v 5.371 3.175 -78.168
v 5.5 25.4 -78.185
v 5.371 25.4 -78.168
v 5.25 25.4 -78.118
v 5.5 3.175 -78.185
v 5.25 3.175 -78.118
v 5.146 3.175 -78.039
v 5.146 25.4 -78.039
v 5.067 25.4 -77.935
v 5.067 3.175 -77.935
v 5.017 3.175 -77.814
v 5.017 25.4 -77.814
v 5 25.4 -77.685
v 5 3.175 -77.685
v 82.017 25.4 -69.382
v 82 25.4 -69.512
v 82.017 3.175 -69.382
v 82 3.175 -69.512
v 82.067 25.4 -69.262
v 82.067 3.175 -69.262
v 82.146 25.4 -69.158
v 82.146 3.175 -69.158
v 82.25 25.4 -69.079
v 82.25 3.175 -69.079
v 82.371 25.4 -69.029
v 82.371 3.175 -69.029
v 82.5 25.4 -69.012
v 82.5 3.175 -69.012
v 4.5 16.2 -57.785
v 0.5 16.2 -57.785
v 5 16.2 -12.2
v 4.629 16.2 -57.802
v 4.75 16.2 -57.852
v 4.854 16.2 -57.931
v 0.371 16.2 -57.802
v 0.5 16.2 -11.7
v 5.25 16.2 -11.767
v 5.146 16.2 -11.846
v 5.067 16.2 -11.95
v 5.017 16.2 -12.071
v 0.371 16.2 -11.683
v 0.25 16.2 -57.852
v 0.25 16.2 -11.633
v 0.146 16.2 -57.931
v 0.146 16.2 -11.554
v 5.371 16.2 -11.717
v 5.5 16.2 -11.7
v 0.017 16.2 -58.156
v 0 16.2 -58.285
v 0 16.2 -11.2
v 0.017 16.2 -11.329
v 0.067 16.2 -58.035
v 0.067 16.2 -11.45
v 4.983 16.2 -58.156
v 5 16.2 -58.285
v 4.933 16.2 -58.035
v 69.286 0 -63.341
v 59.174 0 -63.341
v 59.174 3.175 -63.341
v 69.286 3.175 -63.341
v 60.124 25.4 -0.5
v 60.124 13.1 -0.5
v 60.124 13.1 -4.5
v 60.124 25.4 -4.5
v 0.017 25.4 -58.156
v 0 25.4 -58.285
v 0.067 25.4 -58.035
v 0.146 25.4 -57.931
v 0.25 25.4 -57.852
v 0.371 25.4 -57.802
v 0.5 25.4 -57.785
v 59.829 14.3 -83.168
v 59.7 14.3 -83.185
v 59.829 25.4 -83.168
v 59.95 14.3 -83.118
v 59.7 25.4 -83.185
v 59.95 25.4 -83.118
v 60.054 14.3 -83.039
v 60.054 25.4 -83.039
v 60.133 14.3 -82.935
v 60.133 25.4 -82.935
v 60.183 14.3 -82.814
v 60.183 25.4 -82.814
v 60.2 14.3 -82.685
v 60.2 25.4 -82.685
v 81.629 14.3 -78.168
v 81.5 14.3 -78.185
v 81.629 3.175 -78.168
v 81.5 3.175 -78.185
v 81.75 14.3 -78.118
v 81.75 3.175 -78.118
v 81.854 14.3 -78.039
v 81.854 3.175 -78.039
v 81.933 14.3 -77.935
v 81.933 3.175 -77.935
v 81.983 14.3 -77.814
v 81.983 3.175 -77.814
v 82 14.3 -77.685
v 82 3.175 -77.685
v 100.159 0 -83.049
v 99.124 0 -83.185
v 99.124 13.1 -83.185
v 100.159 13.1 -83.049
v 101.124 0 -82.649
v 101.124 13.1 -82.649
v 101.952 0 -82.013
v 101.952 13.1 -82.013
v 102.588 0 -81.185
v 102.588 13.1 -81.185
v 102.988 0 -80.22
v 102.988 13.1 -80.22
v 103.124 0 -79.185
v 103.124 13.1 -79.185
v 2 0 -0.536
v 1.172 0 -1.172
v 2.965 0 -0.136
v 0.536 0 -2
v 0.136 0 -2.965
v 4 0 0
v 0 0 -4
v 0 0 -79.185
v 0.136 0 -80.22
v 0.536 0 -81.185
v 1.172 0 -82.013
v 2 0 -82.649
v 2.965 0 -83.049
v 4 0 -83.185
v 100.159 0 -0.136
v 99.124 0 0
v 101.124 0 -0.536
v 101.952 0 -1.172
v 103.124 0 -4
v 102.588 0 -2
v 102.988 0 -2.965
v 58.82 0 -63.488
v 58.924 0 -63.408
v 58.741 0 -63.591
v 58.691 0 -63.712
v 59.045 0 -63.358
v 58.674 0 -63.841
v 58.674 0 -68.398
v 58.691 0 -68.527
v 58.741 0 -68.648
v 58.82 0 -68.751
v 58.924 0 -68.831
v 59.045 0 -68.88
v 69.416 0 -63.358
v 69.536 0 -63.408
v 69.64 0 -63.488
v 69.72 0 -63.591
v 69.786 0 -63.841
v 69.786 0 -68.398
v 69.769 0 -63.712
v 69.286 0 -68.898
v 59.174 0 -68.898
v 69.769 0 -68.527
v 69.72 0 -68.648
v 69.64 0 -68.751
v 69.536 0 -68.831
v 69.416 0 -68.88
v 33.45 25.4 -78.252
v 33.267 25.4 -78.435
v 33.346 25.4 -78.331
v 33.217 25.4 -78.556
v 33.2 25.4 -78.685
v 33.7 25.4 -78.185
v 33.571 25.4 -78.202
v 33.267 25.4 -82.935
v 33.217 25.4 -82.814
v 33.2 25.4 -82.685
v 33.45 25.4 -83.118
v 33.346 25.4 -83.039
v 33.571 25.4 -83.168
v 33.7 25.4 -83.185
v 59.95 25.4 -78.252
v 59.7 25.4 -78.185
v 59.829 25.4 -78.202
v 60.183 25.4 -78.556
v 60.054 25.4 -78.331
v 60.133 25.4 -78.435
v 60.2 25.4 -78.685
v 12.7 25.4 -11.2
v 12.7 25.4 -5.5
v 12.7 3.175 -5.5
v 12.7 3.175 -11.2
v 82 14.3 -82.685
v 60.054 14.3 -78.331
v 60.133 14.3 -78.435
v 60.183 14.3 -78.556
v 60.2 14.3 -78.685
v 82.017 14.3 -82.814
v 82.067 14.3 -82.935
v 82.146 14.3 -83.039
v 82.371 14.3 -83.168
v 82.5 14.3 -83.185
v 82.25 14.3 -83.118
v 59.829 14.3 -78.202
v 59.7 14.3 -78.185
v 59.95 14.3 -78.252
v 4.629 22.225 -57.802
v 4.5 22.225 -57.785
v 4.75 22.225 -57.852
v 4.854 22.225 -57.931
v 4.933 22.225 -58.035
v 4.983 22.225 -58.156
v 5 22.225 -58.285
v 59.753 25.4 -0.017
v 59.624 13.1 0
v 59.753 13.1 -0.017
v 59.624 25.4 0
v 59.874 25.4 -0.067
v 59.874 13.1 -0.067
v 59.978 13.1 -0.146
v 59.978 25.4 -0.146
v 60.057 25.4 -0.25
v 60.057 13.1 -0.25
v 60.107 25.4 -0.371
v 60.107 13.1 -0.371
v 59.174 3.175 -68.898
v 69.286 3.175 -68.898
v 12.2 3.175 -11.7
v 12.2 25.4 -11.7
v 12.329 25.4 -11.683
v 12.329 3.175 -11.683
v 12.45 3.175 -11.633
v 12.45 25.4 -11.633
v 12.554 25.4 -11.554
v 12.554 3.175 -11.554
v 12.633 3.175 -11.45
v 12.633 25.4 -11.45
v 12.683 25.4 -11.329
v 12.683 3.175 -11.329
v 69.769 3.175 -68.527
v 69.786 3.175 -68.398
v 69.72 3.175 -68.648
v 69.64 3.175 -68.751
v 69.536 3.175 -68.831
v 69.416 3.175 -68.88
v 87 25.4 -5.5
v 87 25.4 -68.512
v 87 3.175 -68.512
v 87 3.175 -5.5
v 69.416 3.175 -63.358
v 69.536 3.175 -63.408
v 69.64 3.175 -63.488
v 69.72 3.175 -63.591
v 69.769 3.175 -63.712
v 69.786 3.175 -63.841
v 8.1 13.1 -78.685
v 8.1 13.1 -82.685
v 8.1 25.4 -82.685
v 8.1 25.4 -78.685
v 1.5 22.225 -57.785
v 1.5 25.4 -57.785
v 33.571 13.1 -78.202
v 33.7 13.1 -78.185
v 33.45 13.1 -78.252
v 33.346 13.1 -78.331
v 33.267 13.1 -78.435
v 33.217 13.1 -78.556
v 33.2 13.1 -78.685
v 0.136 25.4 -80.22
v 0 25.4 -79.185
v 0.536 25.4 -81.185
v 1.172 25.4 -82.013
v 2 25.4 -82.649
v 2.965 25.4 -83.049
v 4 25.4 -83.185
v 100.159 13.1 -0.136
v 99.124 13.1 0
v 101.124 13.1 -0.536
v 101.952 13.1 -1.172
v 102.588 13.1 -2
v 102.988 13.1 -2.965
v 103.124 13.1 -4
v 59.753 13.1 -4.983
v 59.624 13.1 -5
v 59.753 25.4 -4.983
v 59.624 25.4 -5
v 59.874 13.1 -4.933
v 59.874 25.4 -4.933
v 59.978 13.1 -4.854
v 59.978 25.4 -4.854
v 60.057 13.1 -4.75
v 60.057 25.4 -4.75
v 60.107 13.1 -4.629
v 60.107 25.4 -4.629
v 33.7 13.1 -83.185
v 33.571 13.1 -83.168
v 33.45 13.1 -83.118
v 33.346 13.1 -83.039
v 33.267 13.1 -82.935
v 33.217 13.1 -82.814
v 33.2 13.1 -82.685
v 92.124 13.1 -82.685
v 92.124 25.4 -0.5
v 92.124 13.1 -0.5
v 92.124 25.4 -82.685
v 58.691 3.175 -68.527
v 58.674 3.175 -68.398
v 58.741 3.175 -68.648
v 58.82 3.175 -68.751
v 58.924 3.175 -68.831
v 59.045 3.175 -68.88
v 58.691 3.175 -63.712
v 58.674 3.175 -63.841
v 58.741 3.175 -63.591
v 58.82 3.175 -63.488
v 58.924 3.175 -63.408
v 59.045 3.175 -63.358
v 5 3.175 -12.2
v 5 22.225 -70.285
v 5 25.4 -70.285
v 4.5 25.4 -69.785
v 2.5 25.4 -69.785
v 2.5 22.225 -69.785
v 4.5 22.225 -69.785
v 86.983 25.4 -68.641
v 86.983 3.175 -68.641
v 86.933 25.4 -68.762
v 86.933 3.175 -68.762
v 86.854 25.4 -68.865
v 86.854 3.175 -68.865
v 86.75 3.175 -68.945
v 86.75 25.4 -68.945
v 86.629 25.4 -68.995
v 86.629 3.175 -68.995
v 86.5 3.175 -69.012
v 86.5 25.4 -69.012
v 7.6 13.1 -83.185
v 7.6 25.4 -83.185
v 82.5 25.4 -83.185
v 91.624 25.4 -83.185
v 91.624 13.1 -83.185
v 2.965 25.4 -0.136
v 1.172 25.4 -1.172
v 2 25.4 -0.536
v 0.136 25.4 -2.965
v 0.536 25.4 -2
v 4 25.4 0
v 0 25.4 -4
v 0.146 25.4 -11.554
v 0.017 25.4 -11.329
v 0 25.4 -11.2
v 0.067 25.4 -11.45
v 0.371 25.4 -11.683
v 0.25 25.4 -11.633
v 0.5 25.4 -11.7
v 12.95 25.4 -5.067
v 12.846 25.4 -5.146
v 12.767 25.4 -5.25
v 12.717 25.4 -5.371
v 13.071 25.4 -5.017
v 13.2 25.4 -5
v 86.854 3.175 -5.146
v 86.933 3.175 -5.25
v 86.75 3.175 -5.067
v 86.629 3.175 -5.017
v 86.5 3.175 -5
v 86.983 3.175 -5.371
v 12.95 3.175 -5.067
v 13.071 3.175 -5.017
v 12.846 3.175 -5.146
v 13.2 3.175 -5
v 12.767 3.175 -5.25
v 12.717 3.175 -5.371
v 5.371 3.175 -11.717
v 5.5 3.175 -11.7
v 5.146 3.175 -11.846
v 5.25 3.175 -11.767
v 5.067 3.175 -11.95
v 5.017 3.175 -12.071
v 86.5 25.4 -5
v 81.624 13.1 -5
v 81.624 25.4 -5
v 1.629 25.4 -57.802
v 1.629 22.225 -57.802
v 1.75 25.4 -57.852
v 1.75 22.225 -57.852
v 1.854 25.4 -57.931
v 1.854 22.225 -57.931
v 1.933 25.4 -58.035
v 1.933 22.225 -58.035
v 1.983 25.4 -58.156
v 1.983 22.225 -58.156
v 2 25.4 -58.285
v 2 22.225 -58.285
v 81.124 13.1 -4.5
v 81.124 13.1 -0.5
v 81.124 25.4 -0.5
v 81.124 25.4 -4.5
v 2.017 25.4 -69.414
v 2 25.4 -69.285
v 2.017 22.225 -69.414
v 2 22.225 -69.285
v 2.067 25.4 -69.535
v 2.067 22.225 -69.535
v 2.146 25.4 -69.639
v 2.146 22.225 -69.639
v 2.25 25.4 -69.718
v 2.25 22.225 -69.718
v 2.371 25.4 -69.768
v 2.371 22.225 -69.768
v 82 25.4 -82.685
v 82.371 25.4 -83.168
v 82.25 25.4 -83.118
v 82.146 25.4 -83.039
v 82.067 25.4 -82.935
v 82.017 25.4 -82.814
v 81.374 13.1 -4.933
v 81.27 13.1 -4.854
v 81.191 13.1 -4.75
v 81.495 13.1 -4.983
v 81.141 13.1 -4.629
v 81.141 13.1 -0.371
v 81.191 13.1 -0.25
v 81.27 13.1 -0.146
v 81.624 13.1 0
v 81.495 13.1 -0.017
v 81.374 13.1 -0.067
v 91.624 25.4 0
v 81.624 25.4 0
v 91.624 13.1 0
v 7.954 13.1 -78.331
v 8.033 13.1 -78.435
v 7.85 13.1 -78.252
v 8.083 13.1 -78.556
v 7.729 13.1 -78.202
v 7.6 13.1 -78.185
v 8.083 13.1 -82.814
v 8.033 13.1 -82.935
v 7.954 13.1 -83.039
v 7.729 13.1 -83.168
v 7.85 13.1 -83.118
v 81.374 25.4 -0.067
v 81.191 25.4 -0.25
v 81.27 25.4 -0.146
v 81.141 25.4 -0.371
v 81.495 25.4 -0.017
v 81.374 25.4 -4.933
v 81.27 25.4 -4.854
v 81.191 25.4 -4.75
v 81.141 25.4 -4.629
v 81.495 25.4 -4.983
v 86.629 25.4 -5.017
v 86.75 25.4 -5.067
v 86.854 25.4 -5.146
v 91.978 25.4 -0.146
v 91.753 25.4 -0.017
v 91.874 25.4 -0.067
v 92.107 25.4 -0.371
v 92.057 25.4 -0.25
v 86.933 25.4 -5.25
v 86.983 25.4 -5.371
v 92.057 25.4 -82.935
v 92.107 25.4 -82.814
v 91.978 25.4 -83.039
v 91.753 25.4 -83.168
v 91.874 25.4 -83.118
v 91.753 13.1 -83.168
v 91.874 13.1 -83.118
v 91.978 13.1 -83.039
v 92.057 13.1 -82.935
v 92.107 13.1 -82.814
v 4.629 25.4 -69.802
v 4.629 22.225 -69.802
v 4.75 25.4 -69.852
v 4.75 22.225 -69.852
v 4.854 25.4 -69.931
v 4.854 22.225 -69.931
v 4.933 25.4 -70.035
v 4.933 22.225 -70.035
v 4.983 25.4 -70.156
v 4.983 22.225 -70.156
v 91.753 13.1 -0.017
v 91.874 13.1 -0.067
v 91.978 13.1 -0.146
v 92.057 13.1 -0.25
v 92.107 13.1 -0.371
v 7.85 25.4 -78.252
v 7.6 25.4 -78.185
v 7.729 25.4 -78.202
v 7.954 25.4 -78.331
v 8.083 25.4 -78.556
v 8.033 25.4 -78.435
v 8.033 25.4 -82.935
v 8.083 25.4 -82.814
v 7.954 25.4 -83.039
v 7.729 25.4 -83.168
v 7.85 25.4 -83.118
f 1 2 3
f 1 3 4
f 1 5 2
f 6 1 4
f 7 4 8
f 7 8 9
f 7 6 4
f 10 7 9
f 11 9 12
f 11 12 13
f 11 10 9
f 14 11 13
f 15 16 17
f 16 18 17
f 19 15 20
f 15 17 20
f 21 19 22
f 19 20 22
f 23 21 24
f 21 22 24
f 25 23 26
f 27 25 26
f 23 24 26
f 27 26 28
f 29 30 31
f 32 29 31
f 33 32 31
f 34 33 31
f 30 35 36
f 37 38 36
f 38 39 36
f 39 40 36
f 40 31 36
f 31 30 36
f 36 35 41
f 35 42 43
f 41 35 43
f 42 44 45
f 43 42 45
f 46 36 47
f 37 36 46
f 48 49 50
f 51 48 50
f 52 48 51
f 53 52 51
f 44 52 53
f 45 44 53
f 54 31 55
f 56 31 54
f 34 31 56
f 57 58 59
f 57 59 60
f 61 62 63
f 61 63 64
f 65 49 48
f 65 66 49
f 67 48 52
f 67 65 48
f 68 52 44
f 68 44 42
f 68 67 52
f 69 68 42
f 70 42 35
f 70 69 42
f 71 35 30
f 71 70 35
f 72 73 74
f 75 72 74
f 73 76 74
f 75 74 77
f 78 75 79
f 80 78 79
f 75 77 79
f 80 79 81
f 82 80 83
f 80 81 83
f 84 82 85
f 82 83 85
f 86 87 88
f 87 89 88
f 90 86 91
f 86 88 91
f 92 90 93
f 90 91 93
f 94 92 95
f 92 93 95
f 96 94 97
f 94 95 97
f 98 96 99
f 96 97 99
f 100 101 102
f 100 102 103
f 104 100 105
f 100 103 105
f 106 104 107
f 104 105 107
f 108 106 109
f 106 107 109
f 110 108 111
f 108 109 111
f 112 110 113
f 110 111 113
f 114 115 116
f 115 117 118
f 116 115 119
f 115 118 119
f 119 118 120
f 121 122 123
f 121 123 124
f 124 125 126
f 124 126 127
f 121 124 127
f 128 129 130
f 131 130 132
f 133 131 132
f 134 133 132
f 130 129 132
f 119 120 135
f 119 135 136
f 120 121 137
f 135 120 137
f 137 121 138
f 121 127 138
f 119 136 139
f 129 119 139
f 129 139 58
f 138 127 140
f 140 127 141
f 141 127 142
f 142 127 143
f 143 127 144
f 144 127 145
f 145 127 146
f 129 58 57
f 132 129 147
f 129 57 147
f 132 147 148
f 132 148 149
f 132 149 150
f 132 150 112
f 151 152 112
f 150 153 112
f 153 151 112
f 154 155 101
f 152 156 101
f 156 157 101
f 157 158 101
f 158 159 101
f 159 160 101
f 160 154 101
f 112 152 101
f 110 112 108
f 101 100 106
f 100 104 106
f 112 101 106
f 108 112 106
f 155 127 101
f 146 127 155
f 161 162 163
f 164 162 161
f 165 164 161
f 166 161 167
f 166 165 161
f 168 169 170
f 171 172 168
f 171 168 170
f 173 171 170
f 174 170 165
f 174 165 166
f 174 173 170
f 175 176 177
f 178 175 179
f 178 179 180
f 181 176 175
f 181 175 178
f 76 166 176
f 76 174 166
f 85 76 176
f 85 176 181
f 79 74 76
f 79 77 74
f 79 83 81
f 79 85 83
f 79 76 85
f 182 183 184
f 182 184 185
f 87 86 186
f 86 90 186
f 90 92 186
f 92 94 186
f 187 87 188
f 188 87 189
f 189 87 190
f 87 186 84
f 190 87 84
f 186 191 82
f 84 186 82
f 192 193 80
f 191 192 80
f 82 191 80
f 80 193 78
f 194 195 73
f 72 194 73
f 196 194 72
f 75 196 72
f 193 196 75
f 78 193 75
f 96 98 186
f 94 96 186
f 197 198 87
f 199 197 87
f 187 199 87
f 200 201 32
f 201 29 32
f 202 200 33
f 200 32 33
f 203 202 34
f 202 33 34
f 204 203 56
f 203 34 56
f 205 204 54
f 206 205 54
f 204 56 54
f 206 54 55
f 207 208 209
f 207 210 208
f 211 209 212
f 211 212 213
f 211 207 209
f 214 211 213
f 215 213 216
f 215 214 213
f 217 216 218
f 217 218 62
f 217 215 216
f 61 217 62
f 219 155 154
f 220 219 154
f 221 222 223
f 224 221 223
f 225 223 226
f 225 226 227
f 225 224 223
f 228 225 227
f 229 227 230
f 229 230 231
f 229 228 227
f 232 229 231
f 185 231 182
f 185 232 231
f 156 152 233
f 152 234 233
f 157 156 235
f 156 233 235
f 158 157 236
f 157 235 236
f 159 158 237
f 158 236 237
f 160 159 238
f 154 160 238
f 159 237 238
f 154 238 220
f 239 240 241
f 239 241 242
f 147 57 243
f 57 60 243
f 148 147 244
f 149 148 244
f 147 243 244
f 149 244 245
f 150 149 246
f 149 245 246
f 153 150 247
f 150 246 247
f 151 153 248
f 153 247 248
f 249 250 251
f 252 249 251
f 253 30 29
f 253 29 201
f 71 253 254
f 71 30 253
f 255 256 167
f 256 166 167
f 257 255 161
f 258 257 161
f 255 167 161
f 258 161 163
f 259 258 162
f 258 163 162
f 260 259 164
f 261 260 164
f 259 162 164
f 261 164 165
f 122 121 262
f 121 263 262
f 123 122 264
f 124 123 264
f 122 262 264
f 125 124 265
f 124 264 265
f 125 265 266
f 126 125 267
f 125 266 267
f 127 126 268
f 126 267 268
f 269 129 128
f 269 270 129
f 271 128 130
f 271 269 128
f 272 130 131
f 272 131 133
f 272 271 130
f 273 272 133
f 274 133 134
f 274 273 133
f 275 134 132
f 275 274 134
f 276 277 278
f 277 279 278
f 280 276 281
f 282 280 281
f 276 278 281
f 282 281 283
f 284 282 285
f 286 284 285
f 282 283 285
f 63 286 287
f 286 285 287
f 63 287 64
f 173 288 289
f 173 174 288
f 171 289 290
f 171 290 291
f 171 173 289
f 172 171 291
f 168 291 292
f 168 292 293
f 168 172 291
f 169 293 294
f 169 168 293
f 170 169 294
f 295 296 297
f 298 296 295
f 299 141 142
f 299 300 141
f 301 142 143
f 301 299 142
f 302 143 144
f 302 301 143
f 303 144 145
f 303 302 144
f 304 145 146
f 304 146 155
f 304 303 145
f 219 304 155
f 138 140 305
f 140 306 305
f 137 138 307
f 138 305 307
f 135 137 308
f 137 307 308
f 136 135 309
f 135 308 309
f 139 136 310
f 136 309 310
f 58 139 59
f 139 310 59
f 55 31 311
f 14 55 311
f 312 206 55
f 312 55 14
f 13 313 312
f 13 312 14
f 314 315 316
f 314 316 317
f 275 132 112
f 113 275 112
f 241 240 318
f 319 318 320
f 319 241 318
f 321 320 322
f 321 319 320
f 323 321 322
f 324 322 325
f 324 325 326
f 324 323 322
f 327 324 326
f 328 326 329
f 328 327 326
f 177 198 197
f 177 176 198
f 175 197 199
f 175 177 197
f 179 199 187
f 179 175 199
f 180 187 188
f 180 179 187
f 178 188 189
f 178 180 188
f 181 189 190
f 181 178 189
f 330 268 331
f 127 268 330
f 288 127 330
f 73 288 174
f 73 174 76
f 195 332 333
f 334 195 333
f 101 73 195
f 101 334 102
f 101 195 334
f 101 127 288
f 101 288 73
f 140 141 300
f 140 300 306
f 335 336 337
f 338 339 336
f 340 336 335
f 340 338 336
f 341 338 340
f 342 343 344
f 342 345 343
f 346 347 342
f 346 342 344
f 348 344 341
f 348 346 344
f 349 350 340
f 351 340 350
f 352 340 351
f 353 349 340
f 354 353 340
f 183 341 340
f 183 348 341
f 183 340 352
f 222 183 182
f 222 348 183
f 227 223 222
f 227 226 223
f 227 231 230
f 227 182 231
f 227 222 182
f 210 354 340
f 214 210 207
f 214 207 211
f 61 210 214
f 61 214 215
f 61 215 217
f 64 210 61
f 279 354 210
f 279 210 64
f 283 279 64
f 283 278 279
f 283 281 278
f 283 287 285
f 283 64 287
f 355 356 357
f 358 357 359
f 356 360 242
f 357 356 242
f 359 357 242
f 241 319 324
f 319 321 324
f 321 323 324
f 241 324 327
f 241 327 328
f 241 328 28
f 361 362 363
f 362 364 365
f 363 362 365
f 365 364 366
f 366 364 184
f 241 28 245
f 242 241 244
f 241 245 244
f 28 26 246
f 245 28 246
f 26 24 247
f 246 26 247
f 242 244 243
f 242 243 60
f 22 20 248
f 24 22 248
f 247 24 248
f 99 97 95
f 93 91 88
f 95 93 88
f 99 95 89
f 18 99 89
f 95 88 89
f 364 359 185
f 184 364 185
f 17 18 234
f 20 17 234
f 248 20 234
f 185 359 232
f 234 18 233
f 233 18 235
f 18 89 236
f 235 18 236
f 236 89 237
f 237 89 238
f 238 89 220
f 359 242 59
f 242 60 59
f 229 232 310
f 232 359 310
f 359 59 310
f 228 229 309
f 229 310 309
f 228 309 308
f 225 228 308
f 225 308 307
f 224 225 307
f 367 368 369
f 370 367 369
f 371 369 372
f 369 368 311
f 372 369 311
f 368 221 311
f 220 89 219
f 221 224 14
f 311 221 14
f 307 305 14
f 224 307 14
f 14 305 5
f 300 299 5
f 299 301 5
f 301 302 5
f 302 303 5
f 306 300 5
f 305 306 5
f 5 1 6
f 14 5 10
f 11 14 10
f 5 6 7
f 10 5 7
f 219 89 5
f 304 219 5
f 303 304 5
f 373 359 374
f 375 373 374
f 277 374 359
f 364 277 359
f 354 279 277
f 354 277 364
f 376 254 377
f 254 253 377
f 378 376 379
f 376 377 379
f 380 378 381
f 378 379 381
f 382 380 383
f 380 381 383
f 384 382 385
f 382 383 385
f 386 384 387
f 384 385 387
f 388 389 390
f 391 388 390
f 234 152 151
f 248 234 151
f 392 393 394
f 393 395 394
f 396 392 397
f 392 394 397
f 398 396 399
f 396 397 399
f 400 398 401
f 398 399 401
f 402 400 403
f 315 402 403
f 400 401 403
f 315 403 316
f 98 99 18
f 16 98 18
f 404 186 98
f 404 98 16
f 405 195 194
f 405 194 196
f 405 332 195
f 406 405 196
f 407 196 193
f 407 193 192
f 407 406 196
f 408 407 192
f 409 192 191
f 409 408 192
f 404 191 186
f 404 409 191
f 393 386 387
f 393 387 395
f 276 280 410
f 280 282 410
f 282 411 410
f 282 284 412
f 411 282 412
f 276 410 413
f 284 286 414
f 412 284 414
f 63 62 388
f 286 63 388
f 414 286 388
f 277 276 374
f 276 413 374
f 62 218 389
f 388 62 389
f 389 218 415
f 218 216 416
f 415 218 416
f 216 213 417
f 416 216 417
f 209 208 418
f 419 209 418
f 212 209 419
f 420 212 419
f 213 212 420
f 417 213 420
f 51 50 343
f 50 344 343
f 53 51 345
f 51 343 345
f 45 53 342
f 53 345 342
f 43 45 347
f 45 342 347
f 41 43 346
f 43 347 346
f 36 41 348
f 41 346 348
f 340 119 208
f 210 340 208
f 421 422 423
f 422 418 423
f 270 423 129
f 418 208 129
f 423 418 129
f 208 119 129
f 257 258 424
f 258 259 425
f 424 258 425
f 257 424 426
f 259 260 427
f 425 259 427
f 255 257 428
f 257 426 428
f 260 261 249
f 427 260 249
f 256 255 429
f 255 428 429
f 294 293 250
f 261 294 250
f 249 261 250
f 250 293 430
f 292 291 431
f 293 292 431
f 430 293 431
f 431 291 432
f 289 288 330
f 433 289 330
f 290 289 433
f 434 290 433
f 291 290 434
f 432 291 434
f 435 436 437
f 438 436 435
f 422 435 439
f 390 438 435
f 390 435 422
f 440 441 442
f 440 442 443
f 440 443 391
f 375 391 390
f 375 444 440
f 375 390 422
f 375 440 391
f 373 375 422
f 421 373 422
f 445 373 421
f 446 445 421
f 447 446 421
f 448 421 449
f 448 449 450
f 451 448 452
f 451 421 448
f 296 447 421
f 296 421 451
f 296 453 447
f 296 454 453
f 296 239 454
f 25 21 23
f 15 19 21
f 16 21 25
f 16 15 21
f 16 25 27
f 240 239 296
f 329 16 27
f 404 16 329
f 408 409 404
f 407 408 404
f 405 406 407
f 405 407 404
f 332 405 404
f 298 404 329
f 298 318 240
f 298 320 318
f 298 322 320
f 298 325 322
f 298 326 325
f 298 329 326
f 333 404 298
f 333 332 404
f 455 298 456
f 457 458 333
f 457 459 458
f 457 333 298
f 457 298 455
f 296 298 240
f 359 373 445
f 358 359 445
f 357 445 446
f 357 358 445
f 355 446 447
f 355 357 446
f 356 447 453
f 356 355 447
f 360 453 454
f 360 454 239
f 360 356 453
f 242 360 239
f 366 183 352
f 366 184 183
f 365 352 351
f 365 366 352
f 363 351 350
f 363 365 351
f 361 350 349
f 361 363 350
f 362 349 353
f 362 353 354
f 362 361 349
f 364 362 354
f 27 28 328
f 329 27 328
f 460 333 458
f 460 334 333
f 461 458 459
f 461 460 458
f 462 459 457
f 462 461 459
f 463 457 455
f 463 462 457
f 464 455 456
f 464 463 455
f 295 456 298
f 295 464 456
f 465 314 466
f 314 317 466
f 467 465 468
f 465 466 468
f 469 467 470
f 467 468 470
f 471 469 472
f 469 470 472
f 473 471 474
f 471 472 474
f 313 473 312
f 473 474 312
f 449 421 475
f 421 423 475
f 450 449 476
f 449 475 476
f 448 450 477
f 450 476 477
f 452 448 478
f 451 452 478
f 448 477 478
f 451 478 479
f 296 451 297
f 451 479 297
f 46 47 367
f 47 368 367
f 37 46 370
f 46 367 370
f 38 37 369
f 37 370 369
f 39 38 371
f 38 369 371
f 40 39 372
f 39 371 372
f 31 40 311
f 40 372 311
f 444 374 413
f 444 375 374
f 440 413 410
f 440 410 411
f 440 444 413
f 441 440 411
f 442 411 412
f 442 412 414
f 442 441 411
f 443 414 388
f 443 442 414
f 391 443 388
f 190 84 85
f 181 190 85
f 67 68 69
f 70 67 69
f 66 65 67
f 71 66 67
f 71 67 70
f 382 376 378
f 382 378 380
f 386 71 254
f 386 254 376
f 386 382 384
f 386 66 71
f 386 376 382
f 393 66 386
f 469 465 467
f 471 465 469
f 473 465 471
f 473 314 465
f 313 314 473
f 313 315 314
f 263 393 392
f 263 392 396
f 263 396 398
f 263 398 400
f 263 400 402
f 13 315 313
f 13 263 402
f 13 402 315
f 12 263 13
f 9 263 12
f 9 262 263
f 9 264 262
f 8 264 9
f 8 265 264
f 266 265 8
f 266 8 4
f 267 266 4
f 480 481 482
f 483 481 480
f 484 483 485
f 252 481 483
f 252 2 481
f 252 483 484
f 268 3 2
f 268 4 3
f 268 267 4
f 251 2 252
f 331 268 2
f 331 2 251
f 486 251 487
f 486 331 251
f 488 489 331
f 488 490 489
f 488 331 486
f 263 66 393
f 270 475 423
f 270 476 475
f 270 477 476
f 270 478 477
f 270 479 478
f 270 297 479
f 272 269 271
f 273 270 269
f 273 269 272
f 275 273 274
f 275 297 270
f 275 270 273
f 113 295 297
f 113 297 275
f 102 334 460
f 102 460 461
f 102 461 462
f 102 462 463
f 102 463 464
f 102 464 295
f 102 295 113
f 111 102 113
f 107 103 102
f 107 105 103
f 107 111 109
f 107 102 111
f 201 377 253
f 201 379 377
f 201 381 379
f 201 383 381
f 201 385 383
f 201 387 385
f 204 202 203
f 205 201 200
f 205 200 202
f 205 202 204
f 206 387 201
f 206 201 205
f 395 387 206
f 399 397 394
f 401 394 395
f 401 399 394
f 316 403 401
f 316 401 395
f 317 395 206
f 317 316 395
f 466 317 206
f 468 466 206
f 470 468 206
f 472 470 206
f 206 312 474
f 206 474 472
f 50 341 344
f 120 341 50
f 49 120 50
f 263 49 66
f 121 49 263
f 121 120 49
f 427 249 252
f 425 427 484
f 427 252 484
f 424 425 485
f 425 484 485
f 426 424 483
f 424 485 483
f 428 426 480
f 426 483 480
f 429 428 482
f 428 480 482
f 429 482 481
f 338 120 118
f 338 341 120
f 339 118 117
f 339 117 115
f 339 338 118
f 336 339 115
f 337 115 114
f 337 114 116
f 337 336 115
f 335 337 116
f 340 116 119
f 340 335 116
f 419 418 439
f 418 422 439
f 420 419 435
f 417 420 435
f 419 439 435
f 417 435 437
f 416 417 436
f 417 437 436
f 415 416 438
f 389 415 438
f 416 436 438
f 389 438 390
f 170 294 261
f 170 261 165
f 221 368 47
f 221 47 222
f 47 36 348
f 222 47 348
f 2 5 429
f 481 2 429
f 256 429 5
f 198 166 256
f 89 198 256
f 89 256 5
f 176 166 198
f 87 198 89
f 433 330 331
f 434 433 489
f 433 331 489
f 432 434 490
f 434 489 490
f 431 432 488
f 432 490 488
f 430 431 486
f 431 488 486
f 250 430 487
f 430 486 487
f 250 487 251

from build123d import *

# Parameters (mm, degrees)
SKETCH1_W           = 103.124
SKETCH1_H           = 83.185
BOSS_EXTRUDE1_DEPTH = 25.4
CUT_EXTRUDE1_DEPTH  = 22.225
SKETCH3_W           = 11
SKETCH3_H           = 83.185
CUT_EXTRUDE2_DEPTH  = 12.3
CUT_EXTRUDE3_REACH  = 136.905
SKETCH4_W           = 21.8
SKETCH4_H           = 11.1
SKETCH4_W_2         = 25.1
SKETCH4_H_2         = 12.3
SKETCH6_W           = 46.085
SKETCH6_H           = 9.2
CUT_EXTRUDE5_DEPTH  = 5.08
SKETCH7_W           = 3
SKETCH7_H           = 12
CUT_EXTRUDE6_DEPTH  = 3.175
SKETCH8_W           = 11.1125
SKETCH8_H           = 5.55625
CUT_EXTRUDE7_DEPTH  = 5.08
FILLET1_R           = 4
CUT_EXTRUDE8_REACH  = 136.905
SKETCH9_W           = 21
SKETCH9_H           = 12.3
FILLET2_R           = 0.5


with BuildPart() as part:
    # Sketch1 → Boss-Extrude1 (new body)
    with BuildSketch(Plane(origin=(0, 0, 0), x_dir=(1, 0, 0), z_dir=(0, 1, 0))):
        with Locations((51.562, 41.5925)):
            Rectangle(SKETCH1_W, SKETCH1_H)
    extrude(amount=BOSS_EXTRUDE1_DEPTH)

    # Sketch2 → Cut-Extrude1 (cut)
    with BuildSketch(Plane(origin=(0, 25.4, 0), x_dir=(1, 0, 0), z_dir=(0, 1, 0))):
        Polygon((5, 78.185), (82, 78.185), (82, 69.0118), (87, 69.0118), (87, 5), (12.7, 5), (12.7, 11.7), (5, 11.7), align=None)
    extrude(amount=-CUT_EXTRUDE1_DEPTH, mode=Mode.SUBTRACT)

    # Sketch3 → Cut-Extrude2 (cut)
    with BuildSketch(Plane(origin=(0, 25.4, 0), x_dir=(1, 0, 0), z_dir=(0, 1, 0))):
        with Locations((97.624, 41.5925)):
            Rectangle(SKETCH3_W, SKETCH3_H)
    extrude(amount=-CUT_EXTRUDE2_DEPTH, mode=Mode.SUBTRACT)

    # Sketch4 → Cut-Extrude3 (cut, up to next)
    with BuildSketch(Plane(origin=(0, 0, -83.185), x_dir=(-1, 0, 0), z_dir=(0, 0, -1)), mode=Mode.PRIVATE) as cut_extrude3_sk1:
        with Locations((-71.1, 19.85)):
            Rectangle(SKETCH4_W, SKETCH4_H)
    cut_extrude3_tool1 = extrude(cut_extrude3_sk1.sketch, amount=-CUT_EXTRUDE3_REACH, mode=Mode.PRIVATE) & part.part
    # Sketch4 → Cut-Extrude3 (cut, up to next)
    with BuildSketch(Plane(origin=(0, 0, -83.185), x_dir=(-1, 0, 0), z_dir=(0, 0, -1)), mode=Mode.PRIVATE) as cut_extrude3_sk2:
        with Locations((-20.65, 19.25)):
            Rectangle(SKETCH4_W_2, SKETCH4_H_2)
    cut_extrude3_tool2 = extrude(cut_extrude3_sk2.sketch, amount=-CUT_EXTRUDE3_REACH, mode=Mode.PRIVATE) & part.part
    add(cut_extrude3_tool1.solids().sort_by_distance((71.1, 19.85, -83.185))[0], mode=Mode.SUBTRACT)
    add(cut_extrude3_tool2.solids().sort_by_distance((20.65, 19.25, -83.185))[0], mode=Mode.SUBTRACT)

    # Sketch6 → Cut-Extrude5 (cut)
    with BuildSketch(Plane.ZY):
        with Locations((-34.7425, 20.8)):
            Rectangle(SKETCH6_W, SKETCH6_H)
    extrude(amount=-CUT_EXTRUDE5_DEPTH, mode=Mode.SUBTRACT)

    # Sketch7 → Cut-Extrude6 (cut)
    with BuildSketch(Plane(origin=(0, 25.4, 0), x_dir=(1, 0, 0), z_dir=(0, 1, 0))):
        with Locations((3.5, 63.785)):
            Rectangle(SKETCH7_W, SKETCH7_H)
    extrude(amount=-CUT_EXTRUDE6_DEPTH, mode=Mode.SUBTRACT)

    # Sketch8 → Cut-Extrude7 (cut)
    with BuildSketch(Plane.XZ):
        with Locations((64.23025, -66.119375)):
            Rectangle(SKETCH8_W, SKETCH8_H)
    extrude(amount=-CUT_EXTRUDE7_DEPTH, mode=Mode.SUBTRACT)

    # Fillet1
    fillet1_edges = [part.edges().sort_by_distance(p)[0] for p in [
        (103.124, 6.55, -83.185),
        (103.124, 6.55, 0),
        (0, 12.7, -83.185),
        (0, 12.7, 0),
    ]]
    fillet(fillet1_edges, radius=FILLET1_R)

    # Sketch9 → Cut-Extrude8 (cut, up to next)
    with BuildSketch(Plane.XY, mode=Mode.PRIVATE) as cut_extrude8_sk1:
        with Locations((70.624, 19.25)):
            Rectangle(SKETCH9_W, SKETCH9_H)
    cut_extrude8_tool1 = extrude(cut_extrude8_sk1.sketch, amount=-CUT_EXTRUDE8_REACH, mode=Mode.PRIVATE) & part.part
    add(cut_extrude8_tool1.solids().sort_by_distance((70.624, 19.25, 0))[0], mode=Mode.SUBTRACT)

    # Fillet2
    fillet2_edges = [part.edges().sort_by_distance(p)[0] for p in [
        (5, 19.2125, -57.785),
        (5, 23.8125, -69.785),
        (2, 23.8125, -57.785),
        (2, 23.8125, -69.785),
        (58.674, 1.5875, -68.8975),
        (58.674, 1.5875, -63.34125),
        (69.7865, 1.5875, -63.34125),
        (69.7865, 1.5875, -68.8975),
        (81.124, 19.25, 0),
        (60.124, 19.25, 0),
        (81.124, 19.25, -5),
        (60.124, 19.25, -5),
        (5, 14.2875, -78.185),
        (5, 9.6875, -11.7),
        (12.7, 14.2875, -11.7),
        (12.7, 14.2875, -5),
        (87, 14.2875, -5),
        (87, 14.2875, -69.0118),
        (82, 14.2875, -69.0118),
        (82, 8.7375, -78.185),
        (92.124, 19.25, 0),
        (92.124, 19.25, -83.185),
        (60.2, 19.85, -78.185),
        (82, 19.85, -83.185),
        (60.2, 19.85, -83.185),
        (33.2, 19.25, -78.185),
        (8.1, 19.25, -78.185),
        (33.2, 19.25, -83.185),
        (8.1, 19.25, -83.185),
        (0, 20.8, -11.7),
        (0, 20.8, -57.785),
    ]]
    fillet(fillet2_edges, radius=FILLET2_R)


solid = part.part
